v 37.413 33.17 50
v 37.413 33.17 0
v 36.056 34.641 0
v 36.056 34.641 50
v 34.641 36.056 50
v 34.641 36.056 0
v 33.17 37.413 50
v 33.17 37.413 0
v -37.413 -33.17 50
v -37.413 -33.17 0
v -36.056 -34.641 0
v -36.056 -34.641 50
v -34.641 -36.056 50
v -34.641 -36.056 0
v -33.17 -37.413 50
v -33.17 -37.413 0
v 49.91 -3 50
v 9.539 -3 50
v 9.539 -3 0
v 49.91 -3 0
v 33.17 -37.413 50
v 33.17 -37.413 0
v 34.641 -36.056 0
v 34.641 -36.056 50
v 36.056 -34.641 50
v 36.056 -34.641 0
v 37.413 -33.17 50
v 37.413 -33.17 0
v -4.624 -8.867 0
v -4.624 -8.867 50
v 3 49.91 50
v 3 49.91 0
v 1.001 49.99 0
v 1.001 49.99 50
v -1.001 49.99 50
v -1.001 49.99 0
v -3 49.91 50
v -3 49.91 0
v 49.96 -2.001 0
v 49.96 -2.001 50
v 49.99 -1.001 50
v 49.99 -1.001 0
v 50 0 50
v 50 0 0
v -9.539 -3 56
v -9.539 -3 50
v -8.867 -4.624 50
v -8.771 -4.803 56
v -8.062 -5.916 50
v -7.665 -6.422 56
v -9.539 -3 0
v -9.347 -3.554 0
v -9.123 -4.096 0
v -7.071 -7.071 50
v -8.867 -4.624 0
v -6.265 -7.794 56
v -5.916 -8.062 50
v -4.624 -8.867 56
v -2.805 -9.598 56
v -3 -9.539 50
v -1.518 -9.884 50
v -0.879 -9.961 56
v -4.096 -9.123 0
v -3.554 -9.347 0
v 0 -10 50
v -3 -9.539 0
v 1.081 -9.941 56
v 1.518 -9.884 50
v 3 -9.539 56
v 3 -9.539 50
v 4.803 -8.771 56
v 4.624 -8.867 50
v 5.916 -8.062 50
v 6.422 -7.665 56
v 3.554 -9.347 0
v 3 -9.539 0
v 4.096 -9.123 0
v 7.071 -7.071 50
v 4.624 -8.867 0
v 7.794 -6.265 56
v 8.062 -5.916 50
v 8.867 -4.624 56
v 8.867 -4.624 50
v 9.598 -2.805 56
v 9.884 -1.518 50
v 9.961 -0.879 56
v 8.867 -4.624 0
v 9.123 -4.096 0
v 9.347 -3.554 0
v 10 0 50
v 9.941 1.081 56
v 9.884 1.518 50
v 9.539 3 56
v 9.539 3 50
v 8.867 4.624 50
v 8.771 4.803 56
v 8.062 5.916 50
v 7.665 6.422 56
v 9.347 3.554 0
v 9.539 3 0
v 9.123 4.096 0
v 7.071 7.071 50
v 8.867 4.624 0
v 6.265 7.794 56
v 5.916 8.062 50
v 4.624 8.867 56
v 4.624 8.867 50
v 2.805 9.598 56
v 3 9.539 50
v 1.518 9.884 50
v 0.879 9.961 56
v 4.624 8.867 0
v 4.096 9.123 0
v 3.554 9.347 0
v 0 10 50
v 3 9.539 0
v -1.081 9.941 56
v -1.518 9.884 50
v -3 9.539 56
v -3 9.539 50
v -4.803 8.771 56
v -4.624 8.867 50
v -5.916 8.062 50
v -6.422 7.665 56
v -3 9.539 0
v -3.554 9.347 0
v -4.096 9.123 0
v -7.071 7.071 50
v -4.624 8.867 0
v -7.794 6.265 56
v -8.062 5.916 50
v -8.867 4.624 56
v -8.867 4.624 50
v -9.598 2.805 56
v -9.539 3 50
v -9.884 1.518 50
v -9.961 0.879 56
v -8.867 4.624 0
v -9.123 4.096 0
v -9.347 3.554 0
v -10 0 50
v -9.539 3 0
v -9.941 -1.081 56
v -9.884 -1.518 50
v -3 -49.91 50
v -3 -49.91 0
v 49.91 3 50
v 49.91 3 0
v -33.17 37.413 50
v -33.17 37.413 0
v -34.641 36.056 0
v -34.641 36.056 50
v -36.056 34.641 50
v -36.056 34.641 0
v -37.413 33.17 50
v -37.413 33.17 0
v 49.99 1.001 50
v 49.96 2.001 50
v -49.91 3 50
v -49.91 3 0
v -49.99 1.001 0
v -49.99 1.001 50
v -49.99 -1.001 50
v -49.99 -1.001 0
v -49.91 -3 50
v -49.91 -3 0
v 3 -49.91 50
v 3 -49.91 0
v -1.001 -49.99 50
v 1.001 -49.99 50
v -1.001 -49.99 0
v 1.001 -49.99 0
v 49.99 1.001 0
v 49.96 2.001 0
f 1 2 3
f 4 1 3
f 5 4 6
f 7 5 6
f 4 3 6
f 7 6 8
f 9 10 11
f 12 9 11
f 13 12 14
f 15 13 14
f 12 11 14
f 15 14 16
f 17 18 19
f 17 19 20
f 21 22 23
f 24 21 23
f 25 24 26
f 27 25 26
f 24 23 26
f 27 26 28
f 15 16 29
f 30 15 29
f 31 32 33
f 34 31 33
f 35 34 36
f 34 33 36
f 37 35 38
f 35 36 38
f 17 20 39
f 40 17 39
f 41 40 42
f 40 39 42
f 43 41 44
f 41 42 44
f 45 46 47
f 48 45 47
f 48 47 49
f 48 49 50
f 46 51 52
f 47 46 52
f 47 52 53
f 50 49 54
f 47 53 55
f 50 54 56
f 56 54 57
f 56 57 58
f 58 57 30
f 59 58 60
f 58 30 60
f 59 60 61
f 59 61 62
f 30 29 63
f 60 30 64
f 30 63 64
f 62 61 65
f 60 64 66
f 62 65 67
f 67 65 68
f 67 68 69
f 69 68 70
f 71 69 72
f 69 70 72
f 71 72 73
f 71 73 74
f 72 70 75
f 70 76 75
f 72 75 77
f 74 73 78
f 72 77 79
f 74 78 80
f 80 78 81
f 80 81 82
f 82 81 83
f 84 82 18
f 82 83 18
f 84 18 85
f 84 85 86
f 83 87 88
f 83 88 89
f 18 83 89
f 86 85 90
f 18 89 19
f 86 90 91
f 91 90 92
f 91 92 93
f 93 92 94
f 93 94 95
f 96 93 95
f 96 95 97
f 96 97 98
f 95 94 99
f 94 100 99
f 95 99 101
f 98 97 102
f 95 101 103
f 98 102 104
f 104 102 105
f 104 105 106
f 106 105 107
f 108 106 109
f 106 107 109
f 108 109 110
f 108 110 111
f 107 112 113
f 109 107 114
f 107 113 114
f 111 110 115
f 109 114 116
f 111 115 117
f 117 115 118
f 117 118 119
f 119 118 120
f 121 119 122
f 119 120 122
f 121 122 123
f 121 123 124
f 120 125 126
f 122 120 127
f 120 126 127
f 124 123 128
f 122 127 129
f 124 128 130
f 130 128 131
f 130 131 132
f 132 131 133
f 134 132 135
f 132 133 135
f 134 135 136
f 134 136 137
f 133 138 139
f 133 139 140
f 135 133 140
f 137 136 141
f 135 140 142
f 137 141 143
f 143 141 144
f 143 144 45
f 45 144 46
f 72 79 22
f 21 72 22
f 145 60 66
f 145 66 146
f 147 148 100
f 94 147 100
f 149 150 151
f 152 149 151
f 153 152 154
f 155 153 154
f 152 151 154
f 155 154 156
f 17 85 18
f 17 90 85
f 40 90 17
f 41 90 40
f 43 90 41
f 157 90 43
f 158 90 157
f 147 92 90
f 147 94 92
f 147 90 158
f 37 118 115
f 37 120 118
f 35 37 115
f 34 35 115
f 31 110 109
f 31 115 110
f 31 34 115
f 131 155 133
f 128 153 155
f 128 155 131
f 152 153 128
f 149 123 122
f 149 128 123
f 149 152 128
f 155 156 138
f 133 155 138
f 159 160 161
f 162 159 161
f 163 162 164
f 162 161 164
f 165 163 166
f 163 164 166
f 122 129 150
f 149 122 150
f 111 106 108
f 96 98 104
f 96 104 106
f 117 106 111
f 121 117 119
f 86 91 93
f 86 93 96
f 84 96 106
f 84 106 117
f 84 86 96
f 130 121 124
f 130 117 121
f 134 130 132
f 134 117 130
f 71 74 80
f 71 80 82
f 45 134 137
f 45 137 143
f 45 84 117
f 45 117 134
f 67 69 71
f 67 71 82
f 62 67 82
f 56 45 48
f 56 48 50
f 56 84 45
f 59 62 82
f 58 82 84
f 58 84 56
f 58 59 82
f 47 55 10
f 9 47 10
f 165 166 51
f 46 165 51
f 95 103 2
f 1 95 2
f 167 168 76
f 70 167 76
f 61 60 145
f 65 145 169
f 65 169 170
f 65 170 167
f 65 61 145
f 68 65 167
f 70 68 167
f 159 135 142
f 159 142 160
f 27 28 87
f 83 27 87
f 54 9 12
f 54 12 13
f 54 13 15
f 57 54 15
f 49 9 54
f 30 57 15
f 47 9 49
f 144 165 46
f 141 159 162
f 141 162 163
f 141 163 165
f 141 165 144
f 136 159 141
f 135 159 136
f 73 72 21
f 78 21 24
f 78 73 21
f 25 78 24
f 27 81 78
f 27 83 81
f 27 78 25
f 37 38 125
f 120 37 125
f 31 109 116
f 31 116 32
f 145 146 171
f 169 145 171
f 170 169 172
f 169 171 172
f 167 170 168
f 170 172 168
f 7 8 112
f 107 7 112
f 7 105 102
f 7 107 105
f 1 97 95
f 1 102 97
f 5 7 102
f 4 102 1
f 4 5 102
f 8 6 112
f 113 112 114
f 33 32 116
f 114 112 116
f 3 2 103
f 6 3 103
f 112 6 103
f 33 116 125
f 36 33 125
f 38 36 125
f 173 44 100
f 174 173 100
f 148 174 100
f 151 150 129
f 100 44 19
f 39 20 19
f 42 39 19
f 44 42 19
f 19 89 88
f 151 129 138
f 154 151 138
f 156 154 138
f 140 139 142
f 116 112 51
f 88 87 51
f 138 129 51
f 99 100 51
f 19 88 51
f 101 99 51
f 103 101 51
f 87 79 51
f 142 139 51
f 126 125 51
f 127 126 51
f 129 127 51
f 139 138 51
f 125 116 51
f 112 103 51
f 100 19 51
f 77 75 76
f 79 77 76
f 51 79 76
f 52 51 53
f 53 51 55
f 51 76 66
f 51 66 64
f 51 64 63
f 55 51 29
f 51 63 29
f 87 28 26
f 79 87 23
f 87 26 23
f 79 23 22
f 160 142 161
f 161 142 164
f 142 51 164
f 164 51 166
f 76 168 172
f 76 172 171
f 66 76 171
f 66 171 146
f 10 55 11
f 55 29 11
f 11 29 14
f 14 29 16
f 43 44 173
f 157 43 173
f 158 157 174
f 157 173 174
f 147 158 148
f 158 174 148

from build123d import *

# Parameters (mm, degrees)
BOSS_EXTRUDE1_DEPTH = 50
SKETCH2_R           = 10
BOSS_EXTRUDE3_DEPTH = 6
BOSS_EXTRUDE4_START = -50
SKETCH2_2_R         = 10
BOSS_EXTRUDE4_DEPTH = 50


with BuildPart() as part:
    # Sketch1 → Boss-Extrude1 (new body)
    with BuildSketch(Plane.XY):
        with BuildLine():
            ThreePointArc((3, 49.909918854), (0, 50), (-3, 49.909918854))
            Line((-3, 49.909918854), (-3, 7.242640687))
            Line((-3, 7.242640687), (-33.170321726, 37.412962414))
            ThreePointArc((-33.170321726, 37.412962414), (-35.355339059, 35.355339059), (-37.412962414, 33.170321726))
            Line((-37.412962414, 33.170321726), (-7.242640687, 3))
            Line((-7.242640687, 3), (-49.909918854, 3))
            ThreePointArc((-49.909918854, 3), (-50, 0), (-49.909918854, -3))
            Line((-49.909918854, -3), (-7.242640687, -3))
            Line((-7.242640687, -3), (-37.412962414, -33.170321726))
            ThreePointArc((-37.412962414, -33.170321726), (-35.355339059, -35.355339059), (-33.170321726, -37.412962414))
            Line((-33.170321726, -37.412962414), (-3, -7.242640687))
            Line((-3, -7.242640687), (-3, -49.909918854))
            ThreePointArc((-3, -49.909918854), (0, -50), (3, -49.909918854))
            Line((3, -49.909918854), (3, -7.242640687))
            Line((3, -7.242640687), (33.170321726, -37.412962414))
            ThreePointArc((33.170321726, -37.412962414), (35.355339059, -35.355339059), (37.412962414, -33.170321726))
            Line((37.412962414, -33.170321726), (7.242640687, -3))
            Line((7.242640687, -3), (49.909918854, -3))
            ThreePointArc((49.909918854, -3), (49.97747464, -1.500676065), (50, 0))
            ThreePointArc((50, 0), (49.97747464, 1.500676065), (49.909918854, 3))
            Line((49.909918854, 3), (7.242640687, 3))
            Line((7.242640687, 3), (37.412962414, 33.170321726))
            ThreePointArc((37.412962414, 33.170321726), (35.355339059, 35.355339059), (33.170321726, 37.412962414))
            Line((33.170321726, 37.412962414), (3, 7.242640687))
            Line((3, 7.242640687), (3, 49.909918854))
        make_face()
    extrude(amount=BOSS_EXTRUDE1_DEPTH)

    # Sketch2 → Boss-Extrude3 (add)
    with BuildSketch(Plane.XY.offset(50)):
        Circle(SKETCH2_R)
    extrude(amount=BOSS_EXTRUDE3_DEPTH)

    # Sketch2<2> → Boss-Extrude4 (add)
    with BuildSketch(Plane.XY.offset(50).offset(BOSS_EXTRUDE4_START)):
        Circle(SKETCH2_2_R)
    extrude(amount=BOSS_EXTRUDE4_DEPTH)


solid = part.part
